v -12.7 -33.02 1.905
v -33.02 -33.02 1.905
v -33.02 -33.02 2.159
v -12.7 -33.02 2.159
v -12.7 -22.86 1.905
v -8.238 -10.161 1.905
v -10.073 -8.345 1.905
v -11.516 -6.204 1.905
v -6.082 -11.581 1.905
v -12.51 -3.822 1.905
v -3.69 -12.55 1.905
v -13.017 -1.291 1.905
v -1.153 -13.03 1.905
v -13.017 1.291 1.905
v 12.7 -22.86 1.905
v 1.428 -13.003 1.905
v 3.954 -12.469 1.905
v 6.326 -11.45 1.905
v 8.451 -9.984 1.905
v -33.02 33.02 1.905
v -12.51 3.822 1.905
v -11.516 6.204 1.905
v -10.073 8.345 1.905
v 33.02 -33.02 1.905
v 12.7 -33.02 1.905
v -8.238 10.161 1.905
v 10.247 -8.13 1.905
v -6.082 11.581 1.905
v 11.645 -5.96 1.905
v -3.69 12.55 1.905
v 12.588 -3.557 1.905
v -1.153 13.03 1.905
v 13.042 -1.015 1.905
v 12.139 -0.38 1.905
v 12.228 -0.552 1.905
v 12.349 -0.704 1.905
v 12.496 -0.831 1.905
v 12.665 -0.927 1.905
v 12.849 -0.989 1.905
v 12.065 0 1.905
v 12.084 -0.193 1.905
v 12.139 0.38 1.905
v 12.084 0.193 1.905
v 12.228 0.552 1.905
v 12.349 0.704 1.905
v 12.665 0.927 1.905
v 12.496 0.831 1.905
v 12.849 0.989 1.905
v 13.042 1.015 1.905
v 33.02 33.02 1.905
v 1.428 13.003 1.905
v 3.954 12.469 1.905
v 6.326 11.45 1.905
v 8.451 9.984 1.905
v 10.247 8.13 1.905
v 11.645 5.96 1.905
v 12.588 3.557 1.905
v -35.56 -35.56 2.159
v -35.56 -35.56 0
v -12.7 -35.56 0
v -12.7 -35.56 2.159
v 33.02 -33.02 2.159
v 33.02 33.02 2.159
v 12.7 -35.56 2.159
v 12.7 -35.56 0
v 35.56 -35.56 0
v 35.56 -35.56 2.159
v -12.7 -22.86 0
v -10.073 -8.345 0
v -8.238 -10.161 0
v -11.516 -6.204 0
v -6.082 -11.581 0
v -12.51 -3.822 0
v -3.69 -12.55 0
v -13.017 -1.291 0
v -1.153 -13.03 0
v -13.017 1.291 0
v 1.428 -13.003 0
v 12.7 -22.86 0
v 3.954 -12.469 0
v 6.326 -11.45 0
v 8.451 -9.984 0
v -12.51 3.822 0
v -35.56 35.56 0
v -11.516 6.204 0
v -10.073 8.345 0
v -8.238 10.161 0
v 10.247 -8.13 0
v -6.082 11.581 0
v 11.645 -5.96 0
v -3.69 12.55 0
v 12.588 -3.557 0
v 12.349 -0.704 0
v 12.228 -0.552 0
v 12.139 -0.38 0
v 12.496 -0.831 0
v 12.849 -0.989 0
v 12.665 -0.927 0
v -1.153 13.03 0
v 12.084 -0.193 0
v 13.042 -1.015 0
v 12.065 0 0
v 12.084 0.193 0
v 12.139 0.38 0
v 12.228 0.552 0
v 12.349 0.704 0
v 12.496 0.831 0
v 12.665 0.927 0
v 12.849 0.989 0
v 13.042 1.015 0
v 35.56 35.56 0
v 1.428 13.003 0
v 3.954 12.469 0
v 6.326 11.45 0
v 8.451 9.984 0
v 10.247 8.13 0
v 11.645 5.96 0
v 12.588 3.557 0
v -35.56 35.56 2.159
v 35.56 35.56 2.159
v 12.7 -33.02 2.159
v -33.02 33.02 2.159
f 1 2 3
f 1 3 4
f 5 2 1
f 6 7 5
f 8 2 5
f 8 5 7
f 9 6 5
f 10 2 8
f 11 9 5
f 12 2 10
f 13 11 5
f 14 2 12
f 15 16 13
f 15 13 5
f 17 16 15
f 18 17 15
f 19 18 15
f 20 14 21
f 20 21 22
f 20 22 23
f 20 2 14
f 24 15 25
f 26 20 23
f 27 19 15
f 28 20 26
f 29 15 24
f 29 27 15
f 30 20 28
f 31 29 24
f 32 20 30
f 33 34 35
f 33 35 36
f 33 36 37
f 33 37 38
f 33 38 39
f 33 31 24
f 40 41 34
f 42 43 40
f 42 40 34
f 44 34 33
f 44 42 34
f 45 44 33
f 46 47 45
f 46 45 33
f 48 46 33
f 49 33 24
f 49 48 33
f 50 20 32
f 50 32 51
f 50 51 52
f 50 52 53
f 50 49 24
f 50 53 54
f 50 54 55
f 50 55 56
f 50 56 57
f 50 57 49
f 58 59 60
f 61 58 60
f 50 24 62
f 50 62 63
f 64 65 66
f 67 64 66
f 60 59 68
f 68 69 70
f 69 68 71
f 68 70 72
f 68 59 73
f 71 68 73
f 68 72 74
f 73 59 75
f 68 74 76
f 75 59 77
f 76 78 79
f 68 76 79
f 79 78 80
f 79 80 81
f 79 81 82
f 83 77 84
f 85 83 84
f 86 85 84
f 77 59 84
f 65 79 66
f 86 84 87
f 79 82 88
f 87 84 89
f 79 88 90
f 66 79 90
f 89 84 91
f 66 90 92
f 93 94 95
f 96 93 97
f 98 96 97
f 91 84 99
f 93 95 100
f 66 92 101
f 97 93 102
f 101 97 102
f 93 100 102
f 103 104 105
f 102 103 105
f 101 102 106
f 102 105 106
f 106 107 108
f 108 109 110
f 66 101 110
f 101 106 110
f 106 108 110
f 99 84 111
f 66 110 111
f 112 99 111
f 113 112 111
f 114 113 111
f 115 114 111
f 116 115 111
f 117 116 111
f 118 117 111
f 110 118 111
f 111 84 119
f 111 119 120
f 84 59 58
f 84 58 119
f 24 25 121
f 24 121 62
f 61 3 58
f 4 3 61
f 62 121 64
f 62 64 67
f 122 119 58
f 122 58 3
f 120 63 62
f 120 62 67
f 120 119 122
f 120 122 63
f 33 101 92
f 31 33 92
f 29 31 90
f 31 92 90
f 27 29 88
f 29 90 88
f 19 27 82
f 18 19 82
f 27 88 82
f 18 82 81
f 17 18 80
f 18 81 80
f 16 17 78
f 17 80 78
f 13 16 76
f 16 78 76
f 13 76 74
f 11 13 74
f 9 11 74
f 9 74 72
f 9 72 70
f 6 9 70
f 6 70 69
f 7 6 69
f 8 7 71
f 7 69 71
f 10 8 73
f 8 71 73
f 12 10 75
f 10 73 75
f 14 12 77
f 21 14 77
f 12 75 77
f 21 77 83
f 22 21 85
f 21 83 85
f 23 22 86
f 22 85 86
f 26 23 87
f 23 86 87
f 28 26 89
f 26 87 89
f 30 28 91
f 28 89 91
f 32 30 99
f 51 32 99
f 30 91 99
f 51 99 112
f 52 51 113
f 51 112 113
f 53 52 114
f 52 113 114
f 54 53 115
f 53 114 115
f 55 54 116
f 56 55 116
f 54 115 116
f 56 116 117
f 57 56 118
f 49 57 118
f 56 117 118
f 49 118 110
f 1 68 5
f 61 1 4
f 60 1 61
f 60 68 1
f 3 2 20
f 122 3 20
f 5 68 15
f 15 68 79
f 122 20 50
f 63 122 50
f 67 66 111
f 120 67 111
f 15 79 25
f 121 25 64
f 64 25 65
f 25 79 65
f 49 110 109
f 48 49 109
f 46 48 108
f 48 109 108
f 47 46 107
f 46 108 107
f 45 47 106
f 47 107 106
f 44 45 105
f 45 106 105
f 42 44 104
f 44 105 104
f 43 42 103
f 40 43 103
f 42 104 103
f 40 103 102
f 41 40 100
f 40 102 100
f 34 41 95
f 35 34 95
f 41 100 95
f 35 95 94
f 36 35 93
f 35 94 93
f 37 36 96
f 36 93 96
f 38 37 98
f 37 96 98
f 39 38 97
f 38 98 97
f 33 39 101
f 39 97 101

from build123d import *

# Parameters (mm, degrees)
F0_W     = 66.04
F0_H     = 66.04
F1_DEPTH = 1.905
F0_W_2   = 71.12
F0_H_2   = 71.12
F2_DEPTH = 2.159
F3_W     = 25.4
F3_H     = 25.4
F4_DEPTH = 25.4


with BuildPart() as f1:
    # F0 (on Top) → F1 (new body)
    with BuildSketch(Plane.XY):
        Rectangle(F0_W, F0_H)
        with BuildLine():
            ThreePointArc((13.041544, -1.015234), (-13.081, 0), (13.041544, 1.015234))
            ThreePointArc((13.041544, 1.015234), (12.065, 0), (13.041544, -1.015234))
        make_face(mode=Mode.SUBTRACT)
    extrude(amount=F1_DEPTH)

    # F0 (on Top) → F2 (join)
    with BuildSketch(Plane.XY):
        Rectangle(F0_W_2, F0_H_2)
        Rectangle(F0_W, F0_H, mode=Mode.SUBTRACT)
    extrude(amount=F2_DEPTH)

    # F3 (on face) → F4 (cut)
    with BuildSketch(Plane(origin=(0, 0, 0), x_dir=(1, 0, 0), z_dir=(0, 0, -1))):
        with Locations((0, 35.56)):
            Rectangle(F3_W, F3_H)
    extrude(amount=-F4_DEPTH, mode=Mode.SUBTRACT)


solid = f1.part
